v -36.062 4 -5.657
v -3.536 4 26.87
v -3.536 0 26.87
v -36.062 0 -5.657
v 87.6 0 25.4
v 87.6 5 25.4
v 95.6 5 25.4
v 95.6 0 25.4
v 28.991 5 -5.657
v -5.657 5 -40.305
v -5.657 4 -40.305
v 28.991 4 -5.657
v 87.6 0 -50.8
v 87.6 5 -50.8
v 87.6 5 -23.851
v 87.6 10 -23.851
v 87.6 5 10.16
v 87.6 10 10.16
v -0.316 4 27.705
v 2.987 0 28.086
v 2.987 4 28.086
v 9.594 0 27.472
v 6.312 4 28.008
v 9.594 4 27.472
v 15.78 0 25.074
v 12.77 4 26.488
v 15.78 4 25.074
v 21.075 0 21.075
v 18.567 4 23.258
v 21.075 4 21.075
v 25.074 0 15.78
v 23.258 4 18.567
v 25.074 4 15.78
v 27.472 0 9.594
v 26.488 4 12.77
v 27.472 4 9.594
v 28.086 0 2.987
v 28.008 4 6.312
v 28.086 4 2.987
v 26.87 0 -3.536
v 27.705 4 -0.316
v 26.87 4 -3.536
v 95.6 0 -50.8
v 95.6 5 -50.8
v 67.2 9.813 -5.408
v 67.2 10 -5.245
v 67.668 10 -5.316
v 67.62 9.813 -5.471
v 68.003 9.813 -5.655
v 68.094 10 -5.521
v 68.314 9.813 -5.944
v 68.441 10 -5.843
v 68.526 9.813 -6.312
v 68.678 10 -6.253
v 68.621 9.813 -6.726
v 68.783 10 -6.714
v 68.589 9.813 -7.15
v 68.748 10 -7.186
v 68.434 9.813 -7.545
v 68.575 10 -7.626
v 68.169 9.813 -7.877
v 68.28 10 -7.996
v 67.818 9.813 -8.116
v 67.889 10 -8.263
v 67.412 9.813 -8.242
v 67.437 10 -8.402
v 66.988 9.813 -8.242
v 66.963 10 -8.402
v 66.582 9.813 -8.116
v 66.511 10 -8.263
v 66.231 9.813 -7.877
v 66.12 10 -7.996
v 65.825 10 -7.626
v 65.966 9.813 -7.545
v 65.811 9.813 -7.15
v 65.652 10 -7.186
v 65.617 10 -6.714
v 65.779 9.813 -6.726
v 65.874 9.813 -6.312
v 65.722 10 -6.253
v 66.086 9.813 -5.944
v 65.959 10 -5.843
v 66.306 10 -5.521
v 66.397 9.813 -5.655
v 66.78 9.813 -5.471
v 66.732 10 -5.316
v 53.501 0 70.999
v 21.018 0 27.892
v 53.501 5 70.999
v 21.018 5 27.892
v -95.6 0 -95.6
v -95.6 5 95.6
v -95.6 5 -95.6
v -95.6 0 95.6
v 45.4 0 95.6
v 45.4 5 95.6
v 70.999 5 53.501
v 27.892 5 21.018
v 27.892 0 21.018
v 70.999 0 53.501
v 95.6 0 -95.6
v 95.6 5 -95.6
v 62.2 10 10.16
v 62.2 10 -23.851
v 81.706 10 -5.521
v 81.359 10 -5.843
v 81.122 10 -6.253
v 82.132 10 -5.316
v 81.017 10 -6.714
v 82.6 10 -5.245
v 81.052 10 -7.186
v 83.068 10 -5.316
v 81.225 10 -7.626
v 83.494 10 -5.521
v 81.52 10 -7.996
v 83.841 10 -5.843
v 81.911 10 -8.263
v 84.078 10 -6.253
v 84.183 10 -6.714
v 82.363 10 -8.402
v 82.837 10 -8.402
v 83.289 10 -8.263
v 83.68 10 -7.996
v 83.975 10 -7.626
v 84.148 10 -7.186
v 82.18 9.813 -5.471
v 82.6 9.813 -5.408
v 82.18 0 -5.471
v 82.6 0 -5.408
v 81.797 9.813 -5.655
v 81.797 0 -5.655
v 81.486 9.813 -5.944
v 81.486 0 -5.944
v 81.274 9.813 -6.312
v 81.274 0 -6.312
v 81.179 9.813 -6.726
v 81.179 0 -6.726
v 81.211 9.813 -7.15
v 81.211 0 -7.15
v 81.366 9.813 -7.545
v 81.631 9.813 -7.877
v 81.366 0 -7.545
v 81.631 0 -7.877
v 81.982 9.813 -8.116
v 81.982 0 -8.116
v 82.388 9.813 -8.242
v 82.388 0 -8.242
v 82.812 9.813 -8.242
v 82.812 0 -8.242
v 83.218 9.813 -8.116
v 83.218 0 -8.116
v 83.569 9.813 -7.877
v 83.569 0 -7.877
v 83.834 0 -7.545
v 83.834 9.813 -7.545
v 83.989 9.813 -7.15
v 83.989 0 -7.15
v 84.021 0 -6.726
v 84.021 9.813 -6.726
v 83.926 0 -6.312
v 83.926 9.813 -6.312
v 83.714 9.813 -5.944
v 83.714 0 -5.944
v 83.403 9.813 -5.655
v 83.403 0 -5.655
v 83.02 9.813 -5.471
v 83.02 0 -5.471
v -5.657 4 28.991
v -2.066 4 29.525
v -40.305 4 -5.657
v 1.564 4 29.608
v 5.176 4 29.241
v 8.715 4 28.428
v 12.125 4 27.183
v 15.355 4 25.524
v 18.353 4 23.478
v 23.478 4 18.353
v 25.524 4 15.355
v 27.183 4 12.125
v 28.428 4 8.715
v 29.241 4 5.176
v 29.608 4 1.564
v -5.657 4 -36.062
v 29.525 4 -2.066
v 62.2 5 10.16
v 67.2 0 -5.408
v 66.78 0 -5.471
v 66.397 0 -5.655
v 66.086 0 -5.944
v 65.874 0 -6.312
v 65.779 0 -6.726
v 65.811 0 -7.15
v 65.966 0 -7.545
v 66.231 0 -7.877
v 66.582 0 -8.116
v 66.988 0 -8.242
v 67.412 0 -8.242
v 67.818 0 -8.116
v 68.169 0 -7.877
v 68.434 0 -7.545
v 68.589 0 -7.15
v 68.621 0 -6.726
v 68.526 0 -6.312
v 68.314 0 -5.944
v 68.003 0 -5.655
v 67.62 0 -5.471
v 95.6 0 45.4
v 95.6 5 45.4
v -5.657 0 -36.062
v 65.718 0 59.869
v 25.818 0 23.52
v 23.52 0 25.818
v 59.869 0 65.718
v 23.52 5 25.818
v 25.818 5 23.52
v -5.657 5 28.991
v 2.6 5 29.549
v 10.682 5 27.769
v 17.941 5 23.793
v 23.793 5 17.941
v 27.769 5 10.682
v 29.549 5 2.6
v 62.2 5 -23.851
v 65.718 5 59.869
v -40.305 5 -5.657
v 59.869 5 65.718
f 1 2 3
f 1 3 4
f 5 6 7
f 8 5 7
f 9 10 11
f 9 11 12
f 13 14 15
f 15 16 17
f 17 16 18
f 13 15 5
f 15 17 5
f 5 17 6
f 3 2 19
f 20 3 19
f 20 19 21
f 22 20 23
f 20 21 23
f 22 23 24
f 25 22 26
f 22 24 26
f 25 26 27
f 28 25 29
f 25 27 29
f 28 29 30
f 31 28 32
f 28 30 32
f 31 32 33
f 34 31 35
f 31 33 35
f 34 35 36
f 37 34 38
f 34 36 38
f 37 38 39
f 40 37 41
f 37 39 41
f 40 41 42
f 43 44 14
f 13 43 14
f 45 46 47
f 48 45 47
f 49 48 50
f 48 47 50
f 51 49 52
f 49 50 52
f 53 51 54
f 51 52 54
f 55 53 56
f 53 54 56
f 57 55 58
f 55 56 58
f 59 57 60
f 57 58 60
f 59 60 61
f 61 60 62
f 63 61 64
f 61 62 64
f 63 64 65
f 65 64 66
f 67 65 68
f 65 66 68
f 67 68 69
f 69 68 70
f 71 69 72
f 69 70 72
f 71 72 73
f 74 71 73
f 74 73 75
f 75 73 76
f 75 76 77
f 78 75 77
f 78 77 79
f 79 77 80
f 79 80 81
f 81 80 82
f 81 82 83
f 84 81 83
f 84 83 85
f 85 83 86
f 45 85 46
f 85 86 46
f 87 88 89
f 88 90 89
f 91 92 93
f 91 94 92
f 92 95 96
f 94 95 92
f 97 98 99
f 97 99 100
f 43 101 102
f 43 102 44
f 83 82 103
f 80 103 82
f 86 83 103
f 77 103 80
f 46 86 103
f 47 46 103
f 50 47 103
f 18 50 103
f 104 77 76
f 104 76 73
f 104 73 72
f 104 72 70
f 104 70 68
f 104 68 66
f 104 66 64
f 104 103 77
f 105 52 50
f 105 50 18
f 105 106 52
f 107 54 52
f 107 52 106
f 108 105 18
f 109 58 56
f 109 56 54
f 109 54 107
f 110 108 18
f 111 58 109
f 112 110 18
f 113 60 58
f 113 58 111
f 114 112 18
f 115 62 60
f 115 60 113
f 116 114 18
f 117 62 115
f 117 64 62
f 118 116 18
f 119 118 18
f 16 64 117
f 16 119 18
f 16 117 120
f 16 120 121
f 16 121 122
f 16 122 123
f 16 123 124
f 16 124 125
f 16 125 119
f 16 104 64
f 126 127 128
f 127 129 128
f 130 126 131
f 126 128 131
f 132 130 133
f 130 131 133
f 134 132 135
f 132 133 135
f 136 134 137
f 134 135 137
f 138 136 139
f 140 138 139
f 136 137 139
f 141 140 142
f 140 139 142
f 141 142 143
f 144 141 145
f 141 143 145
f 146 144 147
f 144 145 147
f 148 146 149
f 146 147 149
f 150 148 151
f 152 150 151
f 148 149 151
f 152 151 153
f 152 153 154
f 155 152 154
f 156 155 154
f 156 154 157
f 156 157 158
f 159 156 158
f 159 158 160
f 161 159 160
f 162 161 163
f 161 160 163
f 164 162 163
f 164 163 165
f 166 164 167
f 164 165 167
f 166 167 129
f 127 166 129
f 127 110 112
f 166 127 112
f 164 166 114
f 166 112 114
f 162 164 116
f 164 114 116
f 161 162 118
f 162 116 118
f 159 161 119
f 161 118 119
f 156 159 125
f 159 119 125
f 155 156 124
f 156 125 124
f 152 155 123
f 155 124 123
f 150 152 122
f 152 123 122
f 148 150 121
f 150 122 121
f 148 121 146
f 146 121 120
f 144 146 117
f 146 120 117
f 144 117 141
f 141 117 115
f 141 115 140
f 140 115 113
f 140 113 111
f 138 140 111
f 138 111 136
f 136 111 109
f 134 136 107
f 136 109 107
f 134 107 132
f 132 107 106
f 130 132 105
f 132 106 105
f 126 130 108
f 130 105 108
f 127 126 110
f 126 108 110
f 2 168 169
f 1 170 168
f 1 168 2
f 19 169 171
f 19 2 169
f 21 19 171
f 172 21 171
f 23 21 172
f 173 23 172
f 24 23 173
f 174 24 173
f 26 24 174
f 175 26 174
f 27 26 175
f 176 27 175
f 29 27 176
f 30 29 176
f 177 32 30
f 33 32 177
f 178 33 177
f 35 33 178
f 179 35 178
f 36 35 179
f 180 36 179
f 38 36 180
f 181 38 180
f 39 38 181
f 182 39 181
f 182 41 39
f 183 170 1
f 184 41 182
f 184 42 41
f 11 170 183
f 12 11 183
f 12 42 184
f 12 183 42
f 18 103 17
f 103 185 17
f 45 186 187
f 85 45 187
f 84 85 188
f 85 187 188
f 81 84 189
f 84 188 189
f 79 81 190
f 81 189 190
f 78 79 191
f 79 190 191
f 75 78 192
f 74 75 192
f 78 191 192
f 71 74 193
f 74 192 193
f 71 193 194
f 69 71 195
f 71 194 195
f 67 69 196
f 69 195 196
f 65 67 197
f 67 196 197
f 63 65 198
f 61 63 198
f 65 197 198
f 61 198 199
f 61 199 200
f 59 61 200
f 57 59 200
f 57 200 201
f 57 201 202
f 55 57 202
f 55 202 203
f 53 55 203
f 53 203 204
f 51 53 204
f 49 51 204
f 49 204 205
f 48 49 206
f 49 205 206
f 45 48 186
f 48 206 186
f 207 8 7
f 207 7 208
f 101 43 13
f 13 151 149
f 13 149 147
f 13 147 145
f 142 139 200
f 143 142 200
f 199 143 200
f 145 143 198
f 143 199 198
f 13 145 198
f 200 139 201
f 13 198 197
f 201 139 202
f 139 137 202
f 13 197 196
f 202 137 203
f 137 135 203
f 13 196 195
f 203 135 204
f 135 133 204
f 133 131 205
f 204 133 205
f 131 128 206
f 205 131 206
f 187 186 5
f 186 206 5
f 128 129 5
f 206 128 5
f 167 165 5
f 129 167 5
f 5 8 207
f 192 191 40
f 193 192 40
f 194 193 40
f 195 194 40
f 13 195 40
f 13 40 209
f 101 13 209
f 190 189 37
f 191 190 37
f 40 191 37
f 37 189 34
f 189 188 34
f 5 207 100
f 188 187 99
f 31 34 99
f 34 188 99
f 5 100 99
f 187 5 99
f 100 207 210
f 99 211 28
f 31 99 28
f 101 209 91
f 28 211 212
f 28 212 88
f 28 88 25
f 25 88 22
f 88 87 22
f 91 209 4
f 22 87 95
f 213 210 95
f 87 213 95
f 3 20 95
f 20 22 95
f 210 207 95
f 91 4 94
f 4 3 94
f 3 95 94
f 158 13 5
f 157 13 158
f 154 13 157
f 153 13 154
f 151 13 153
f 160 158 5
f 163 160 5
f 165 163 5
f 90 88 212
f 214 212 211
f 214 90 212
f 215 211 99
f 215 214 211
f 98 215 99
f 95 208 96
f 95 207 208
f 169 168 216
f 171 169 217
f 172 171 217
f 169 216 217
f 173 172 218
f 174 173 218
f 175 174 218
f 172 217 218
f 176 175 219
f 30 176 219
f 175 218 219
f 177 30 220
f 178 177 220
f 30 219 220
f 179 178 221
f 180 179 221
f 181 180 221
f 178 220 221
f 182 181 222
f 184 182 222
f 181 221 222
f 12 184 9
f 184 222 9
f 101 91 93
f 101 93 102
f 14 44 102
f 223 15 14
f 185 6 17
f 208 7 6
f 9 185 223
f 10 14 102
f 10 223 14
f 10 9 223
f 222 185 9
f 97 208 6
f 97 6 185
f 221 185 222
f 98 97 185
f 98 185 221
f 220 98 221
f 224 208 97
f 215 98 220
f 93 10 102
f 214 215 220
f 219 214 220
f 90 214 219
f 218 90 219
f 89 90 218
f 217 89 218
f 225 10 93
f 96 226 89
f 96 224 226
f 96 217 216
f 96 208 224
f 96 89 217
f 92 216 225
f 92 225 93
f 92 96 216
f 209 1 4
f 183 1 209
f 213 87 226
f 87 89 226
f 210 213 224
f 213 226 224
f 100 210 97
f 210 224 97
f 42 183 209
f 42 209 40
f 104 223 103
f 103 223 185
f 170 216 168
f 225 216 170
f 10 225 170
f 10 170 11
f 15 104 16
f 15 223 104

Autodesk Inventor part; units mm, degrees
ref_plane "YZ Plane" through (0, 0, 0) normal (1, 0, 0) x (0, 1, 0)
ref_plane "XZ Plane" through (0, 0, 0) normal (0, 1, 0) x (-1, 0, 0)
ref_plane "XY Plane" through (0, 0, 0) normal (0, 0, 1) x (1, 0, 0)
sketch "Sketch1" plane through (0, 0, 0) normal (0, 1, 0) x (-1, 0, 0)
  line L0 (101.6, -101.6) -> (-101.6, -101.6)
  line L1 (-101.6, -101.6) -> (-101.6, 101.6)
  line L2 (-101.6, 101.6) -> (101.6, 101.6)
  line L3 (101.6, 101.6) -> (101.6, -101.6)
  line L4 (96.6, -96.6) -> (-96.6, -96.6)
  line L5 (-96.6, -96.6) -> (-96.6, 96.6)
  line L6 (-96.6, 96.6) -> (96.6, 96.6)
  line L7 (96.6, 96.6) -> (96.6, -96.6)
  line L8 (101.6, 101.6) -> (-40.4, 101.6)
  circle A0 centre (0, 0) radius 88.9
  line L9 (-40.4, 101.6) -> (-101.6, 40.4)
  line L10 (-45.4, 101.6) -> (-101.6, 45.4)
  line L11 (96.6, 96.6) -> (96.6, 101.6)
  line L12 (-45.4, 101.6) -> (-35.4, 101.6)
  line L13 (-35.4, 101.6) -> (-35.4, 96.6)
  line L14 (-35.4, 96.6) -> (-45.4, 96.6)
  line L15 (-45.4, 96.6) -> (-45.4, 101.6)
  line L16 (-101.6, 39.4) -> (-39.4, 101.6)
  line L17 (95.6, -95.6) -> (-95.6, -95.6)
  line L18 (-95.6, -95.6) -> (-95.6, 95.6)
  line L19 (-95.6, 95.6) -> (95.6, 95.6)
  line L20 (95.6, 95.6) -> (95.6, -95.6)
  point P0 (96.6, 51.2168)
  point P1 (101.6, 40.4)
  point P2 (101.6, -40.4)
  point P3 (96.6, -51.2168)
  point P4 (-96.6, 45.4)
  point P5 (-45.4, 96.6)
  point P6 (-45.4, 95.6)
  point P7 (-95.6, 45.4)
  dimension "d0" = 203.2
  dimension "d1" = 203.2
  dimension "d2" = 101.6
  dimension "d3" = 101.6
  dimension "d4" = 5
  dimension "d5" = 5
  dimension "d6" = 5
  dimension "d7" = 5
  dimension "d8" = 142
  dimension "d9" = 61.2
  dimension "d10" = 177.8
  dimension "d11" = 5
  dimension "d12" = 5
  dimension "d13" = 10
  dimension "d14" = 1
  dimension "d15" = 1
  dimension "d16" = 1
  dimension "d17" = 1
  dimension "d18" = 1
extrude "Extrusion1" add sketch "Sketch1" along normal blind 5 contours L16 L19 L20 L17 L18 | A0
sketch "Sketch2" plane through (0, 5, 0) normal (0, 1, 0) x (1, 0, 0)
  circle A0 centre (0, 0) radius 34.925
  circle A1 centre (0, 0) radius 88.9
  line L0 (0, 0) -> (53.5014, -70.9987)
  line L1 (0, 0) -> (70.9987, -53.5014)
  line L2 (45.4, -95.6) -> (95.6, -45.4) projected
  line L3 (70.5, -70.5) -> (0, 0)
  point P0 (21.0184, -27.8923)
  point P1 (27.8923, -21.0184)
  dimension "d21" = 69.85
  dimension "d22" = 177.8
  dimension "d23" = 8
  dimension "d24" = 8
extrude "Extrusion2" cut sketch "Sketch2" against normal blind 5 contours A0 L3 A1 L0 | L1 A1 L3 A0
sketch "Sketch3" plane through (0, 5, 0) normal (0, 1, 0) x (1, 0, 0)
  circle A0 centre (0, 0) radius 2.5
  line L0 (11.3314, 2.139) -> (-2.139, -11.3314)
  line L1 (0, 0) -> (-5.6569, 5.6569)
  line L2 (-5.6569, -14.8492) -> (-26.163, 5.6569)
  line L3 (-5.6569, 26.163) -> (14.8492, 5.6569)
  circle A1 centre (-5.6569, 5.6569) radius 14
  line L4 (-26.163, 5.6569) -> (-5.6569, 26.163)
  line L5 (14.8492, 5.6569) -> (-5.6569, -14.8492)
  line L6 (-40.3051, 5.6569) -> (-5.6569, 40.3051)
  line L7 (-5.6569, 40.3051) -> (28.9914, 5.6569)
  line L8 (28.9914, 5.6569) -> (-5.6569, -28.9914)
  line L9 (-5.6569, -28.9914) -> (-40.3051, 5.6569)
  line L10 (-22.6451, 9.1747) -> (-9.1747, 22.6451)
  line L11 (-9.1747, 22.6451) -> (-12.7668, 26.2372)
  line L12 (-12.7668, 26.2372) -> (-26.2372, 12.7668)
  line L13 (-26.2372, 12.7668) -> (-22.6451, 9.1747)
  line L14 (-36.0624, 5.6569) -> (-5.6569, 36.0624)
  line L15 (-5.6569, 36.0624) -> (26.8701, 3.5355)
  line L16 (26.8701, 3.5355) -> (-3.5355, -26.8701)
  line L17 (-3.5355, -26.8701) -> (-36.0624, 5.6569)
  arc A2 (-5.6569, -28.9914) -> (28.9914, 5.6569) centre (0.4206, -0.4206) ccw
  dimension "d27" = 8
  dimension "d28" = 28
  dimension "d29" = 29
  dimension "d30" = 29
  dimension "d31" = 14.5
  dimension "d32" = 10
  dimension "d33" = 10
  dimension "d34" = 10
  dimension "d35" = 10
  dimension "d36" = 5.08
  dimension "d37" = 9.525
  dimension "d38" = 9.525
  dimension "d39" = 3
  dimension "d40" = 3
  dimension "d41" = 0
  dimension "d42" = 3
  dimension "d51" = 29.21
extrude "Extrusion3" cut sketch "Sketch3" against normal blind 1 contours A0 | L0 L5 L2 L4 L3 | L4 L13 L12 L11 | A1 | L6 L7 L8 L15 L14 L17 L9 | L8 A2 | L17 L14 L15 L8
sketch "Sketch4" plane through (0, 4, 0) normal (0, 1, 0) x (1, 0, 0)
  line L0 (-36.0624, 5.6569) -> (-5.6569, 36.0624)
  line L1 (-5.6569, 36.0624) -> (26.8701, 3.5355)
  line L2 (26.8701, 3.5355) -> (-3.5355, -26.8701)
  line L3 (-3.5355, -26.8701) -> (-36.0624, 5.6569)
  line L4 (-5.6569, 40.3051) -> (28.9914, 5.6569) projected
  line L5 (-40.3051, 5.6569) -> (-5.6569, 40.3051) projected
  line L6 (-5.6569, -28.9914) -> (-40.3051, 5.6569) projected
  line L7 (28.9914, 5.6569) -> (-5.6569, -28.9914) projected
  arc A0 (-3.5355, -26.8701) -> (26.8701, 3.5355) centre (4.0877, -4.0877) ccw
  point P0 (0, 0)
  dimension "d45" = 3
  dimension "d46" = 3
  dimension "d47" = 3
  dimension "d48" = 0
extrude "Extrusion4" cut sketch "Sketch4" against normal blind 5 contours L0 L1 L2 L3 | L2 A0
sketch "Sketch6" plane through (0, 5, 0) normal (0, 1, 0) x (1, 0, 0)
  line L0 (95.6, 95.6) -> (-95.6, 95.6) projected
  line L1 (95.6, 95.6) -> (87.6, 95.6)
  line L2 (87.6, 95.6) -> (87.6, -46.4)
  line L3 (87.6, -46.4) -> (95.6, -46.4)
  line L4 (95.6, -46.4) -> (95.6, 95.6)
  line L5 (95.6, -45.4) -> (95.6, 95.6) projected
  line L6 (87.6, -25.4) -> (95.6, -25.4)
  line L7 (95.6, -25.4) -> (95.6, 50.8)
  line L8 (95.6, 50.8) -> (87.6, 50.8)
  line L9 (87.6, 50.8) -> (87.6, -25.4)
  line L10 (0, 0) -> (95.6, 0)
  dimension "d58" = 8
  dimension "d59" = 142
  dimension "d62" = 50.8
  dimension "d63" = 25.4
extrude "Extrusion6" cut sketch "Sketch6" against normal blind 25.4 contours L4 L10 L2 L8 | L4 L6 L2 L10
sketch "Sketch7" plane through (0, 5, 0) normal (0, 1, 0) x (1, 0, 0)
  line L0 (-95.6, 95.6) -> (-95.6, -95.6) projected
  line L1 (-95.6, -95.6) -> (45.4, -95.6) projected
  line L2 (95.6, 50.8) -> (87.6, 50.8) projected
  line L3 (87.6, 50.8) -> (62.2, 50.8)
  line L4 (87.6, -25.4) -> (87.6, 50.8)
  line L5 (87.6, -25.4) -> (87.6, 50.8) projected
  line L6 (87.6, 50.8) -> (95.6, 50.8) projected
  line L7 (87.6, 50.8) -> (62.2, 50.8)
  line L8 (62.2, 50.8) -> (62.2, -10.16)
  line L9 (62.2, -10.16) -> (87.6, -10.16)
  line L10 (87.6, -10.16) -> (87.6, 50.8)
  line L11 (62.2, 23.8506) -> (87.6, 23.8506)
  point P0 (0, 0)
  dimension "d72" = 60.96
  dimension "d90" = 34.0106
extrude "Extrusion7" add sketch "Sketch7" along normal blind 5 contours L4 L9 L8 L11
sketch "Sketch8" plane through (0, 10, 0) normal (0, 1, 0) x (1, 0, 0)
  line L0 (48.8597, -4.3723) -> (48.8597, 15.6277)
  line L1 (14.8597, -4.3723) -> (14.8597, 15.6277)
  line L2 (48.8597, 15.6277) -> (14.8597, 15.6277)
  line L3 (31.8597, 15.6277) -> (31.8597, -4.3723)
  circle A0 centre (31.8597, 10.6277) radius 1
  circle A1 centre (31.8597, 0.6277) radius 1
  line L4 (62.2, -10.16) -> (87.6, -10.16) projected
  line L5 (62.2, -10.16) -> (87.6, -10.16)
  line L6 (87.6, -10.16) -> (87.6, 6.8326)
  line L7 (87.6, 50.8) -> (87.6, -25.4) projected
  line L8 (87.6, 6.8326) -> (62.2, 6.8326)
  circle A2 centre (82.6, 6.8326) radius 1.5
  circle A3 centre (67.2, 6.8326) radius 1.5
  point P0 (0, 0)
  dimension "d73" = 2
  dimension "d74" = 2
  dimension "d75" = 5
  dimension "d76" = 5
  dimension "d77" = 17
  dimension "d78" = 16.9926
  dimension "d79" = 3
  dimension "d80" = 3
  dimension "d81" = 5
  dimension "d82" = 5
hole "Hole1" at (82.6, 10, -6.8326) at (67.2, 10, -6.8326) direction (0, -1, 0) diameter 2.85 depth 12.7 tip angle 118 countersink diameter 3.175 countersink angle 82 thread size "M3.5x0.6" class "6H" standard "ANSI Metric M Profile"
equation "\"d1\" = d0"
equation "\"d2\" = 0.5 * d0"
equation "\"d3\" = 0.5 * d0"
properties part number "Drop_Plate"
